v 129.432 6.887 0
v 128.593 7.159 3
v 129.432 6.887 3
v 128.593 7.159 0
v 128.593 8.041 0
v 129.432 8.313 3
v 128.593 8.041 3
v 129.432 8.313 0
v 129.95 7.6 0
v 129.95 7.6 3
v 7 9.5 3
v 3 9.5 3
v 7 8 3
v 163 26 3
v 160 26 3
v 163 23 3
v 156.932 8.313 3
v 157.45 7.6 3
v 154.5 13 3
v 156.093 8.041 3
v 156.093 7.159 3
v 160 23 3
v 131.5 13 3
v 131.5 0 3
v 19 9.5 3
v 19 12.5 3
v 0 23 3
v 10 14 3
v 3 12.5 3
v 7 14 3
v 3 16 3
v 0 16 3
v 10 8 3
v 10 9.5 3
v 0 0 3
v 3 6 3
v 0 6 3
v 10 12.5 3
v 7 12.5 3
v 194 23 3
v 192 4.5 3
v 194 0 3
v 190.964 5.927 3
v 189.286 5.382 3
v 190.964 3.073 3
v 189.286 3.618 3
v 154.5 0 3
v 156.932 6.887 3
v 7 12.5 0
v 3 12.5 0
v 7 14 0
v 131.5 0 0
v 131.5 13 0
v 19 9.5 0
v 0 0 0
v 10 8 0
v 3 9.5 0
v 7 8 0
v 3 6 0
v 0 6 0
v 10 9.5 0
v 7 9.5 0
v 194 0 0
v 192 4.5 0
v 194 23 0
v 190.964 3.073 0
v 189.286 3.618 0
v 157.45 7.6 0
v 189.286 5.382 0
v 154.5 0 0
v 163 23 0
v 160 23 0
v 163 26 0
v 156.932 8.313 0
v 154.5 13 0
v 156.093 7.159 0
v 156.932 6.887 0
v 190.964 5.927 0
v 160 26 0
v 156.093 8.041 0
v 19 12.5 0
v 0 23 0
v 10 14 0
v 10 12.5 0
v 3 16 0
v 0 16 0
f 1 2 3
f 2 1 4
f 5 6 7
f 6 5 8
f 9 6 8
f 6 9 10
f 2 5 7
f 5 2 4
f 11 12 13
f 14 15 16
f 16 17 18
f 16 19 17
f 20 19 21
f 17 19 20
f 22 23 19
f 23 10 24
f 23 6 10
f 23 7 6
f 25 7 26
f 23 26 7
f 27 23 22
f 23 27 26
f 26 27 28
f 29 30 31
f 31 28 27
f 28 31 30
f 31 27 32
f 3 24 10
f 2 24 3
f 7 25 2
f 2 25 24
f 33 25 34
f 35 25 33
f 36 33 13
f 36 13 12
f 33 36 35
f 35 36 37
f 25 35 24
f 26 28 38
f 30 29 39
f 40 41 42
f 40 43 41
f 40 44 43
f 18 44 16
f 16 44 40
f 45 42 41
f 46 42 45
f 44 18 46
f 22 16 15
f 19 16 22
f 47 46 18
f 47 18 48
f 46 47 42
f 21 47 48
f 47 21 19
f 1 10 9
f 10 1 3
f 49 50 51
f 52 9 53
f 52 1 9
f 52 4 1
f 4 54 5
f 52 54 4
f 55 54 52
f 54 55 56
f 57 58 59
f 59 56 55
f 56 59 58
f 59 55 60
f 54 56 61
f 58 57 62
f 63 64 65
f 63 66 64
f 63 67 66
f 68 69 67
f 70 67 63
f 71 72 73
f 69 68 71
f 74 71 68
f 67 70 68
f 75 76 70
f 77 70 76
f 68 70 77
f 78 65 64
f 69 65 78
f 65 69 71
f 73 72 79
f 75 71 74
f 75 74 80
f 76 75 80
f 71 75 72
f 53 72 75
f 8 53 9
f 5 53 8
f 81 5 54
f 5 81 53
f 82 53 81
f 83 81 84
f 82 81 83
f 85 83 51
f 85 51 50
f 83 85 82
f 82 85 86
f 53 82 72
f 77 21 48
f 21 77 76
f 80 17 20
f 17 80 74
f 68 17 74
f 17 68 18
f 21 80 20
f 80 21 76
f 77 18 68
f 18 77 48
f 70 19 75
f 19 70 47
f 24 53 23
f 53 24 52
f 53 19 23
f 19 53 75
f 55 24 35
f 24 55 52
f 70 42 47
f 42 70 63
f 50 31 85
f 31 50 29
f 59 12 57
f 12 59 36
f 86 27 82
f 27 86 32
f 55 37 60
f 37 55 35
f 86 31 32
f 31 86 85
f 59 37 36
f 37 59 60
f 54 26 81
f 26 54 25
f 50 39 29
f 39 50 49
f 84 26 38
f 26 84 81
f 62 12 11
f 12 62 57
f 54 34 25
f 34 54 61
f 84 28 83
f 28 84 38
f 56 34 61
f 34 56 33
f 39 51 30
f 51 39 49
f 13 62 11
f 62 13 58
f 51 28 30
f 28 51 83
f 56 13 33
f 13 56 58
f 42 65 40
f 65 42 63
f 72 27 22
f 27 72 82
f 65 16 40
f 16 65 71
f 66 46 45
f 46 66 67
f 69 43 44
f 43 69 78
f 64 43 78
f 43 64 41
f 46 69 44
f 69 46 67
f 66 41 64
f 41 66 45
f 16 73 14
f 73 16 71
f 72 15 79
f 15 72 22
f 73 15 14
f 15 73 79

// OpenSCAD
deviceLength = 153;

totalLength = deviceLength + 41;
totalWidth = 23.0;
thickness = 3.0;
servoCutoutLength = 23.0;
servoCutoutWidth = 13.0;
screwEdgeToServoEdgeDistance = 62.5;
servoMountingHoleSpacing = 27.5;
servoMountingHoleRadius = 0.75;

pivotHoleRadius = 1.5;

module screwAndNutCutout() {
	union() {
		cube([3, 10, thickness]);
		translate([3.0, 3.5, 0]) cube([16, 3.0, thickness]);
		translate([7.0, 2.0, 0]) cube([3, 6, thickness]);
	}
}

module screwAndNutCutoutRotated() {
	rotate([0, 0, -90]) {
		screwAndNutCutout();
	}
}

module topPlateSlot() {
	cube([thickness, thickness, thickness]);
}

union() {
	difference() {
		cube([totalLength, totalWidth, thickness]);
		translate([totalLength - screwEdgeToServoEdgeDistance, 0, 0]) {
			cube([servoCutoutLength, servoCutoutWidth, thickness]);
			translate([-2.3, 7.6, 0]) {
				cylinder(r=servoMountingHoleRadius, h=thickness);
				translate([servoMountingHoleSpacing, 0, 0]) cylinder(r=servoMountingHoleRadius, h=thickness);
			}
		}
		translate([0, 6.0, 0]) screwAndNutCutout();
		translate([deviceLength / 2, 1811, 0]) screwAndNutCutoutRotated();
		translate([totalLength - 3.5, 4.5, 0]) cylinder(r=pivotHoleRadius, h=thickness);
	}
	translate([totalLength - 34, totalWidth, 0]) topPlateSlot();
}
